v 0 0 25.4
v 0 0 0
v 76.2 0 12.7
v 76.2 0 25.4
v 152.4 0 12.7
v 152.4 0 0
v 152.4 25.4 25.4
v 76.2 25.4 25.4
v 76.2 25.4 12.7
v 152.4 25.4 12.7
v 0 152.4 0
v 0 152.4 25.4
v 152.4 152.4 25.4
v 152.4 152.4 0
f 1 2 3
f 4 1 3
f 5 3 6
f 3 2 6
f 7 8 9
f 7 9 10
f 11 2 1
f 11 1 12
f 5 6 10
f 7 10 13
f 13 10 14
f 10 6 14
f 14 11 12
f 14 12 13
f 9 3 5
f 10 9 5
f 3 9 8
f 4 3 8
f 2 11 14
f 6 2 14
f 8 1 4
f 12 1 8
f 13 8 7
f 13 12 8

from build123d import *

# Parameters (mm, degrees)
F0_W       = 152.4
F0_H       = 152.4
F1_DEPTH   = 25.4
F2_W       = 76.2
F2_H       = 12.7
F1_FACE1_W = 152.4
F1_FACE1_H = 25.4
F3_DEPTH   = 25.4


with BuildPart() as f1:
    # F0 (on Top) → F1 (new body)
    with BuildSketch(Plane.XY):
        with Locations((76.2, 76.2)):
            Rectangle(F0_W, F0_H)
    extrude(amount=F1_DEPTH)

    # F2 (on face) + F1_face1 (on face) → F3 (cut)
    with BuildSketch(Plane.XZ):
        with Locations((114.3, 19.05)):
            Rectangle(F2_W, F2_H)
    with BuildSketch(Plane(origin=(76.2, 152.4, 12.7), x_dir=(-1, 0, 0), z_dir=(0, 1, 0))):
        Rectangle(F1_FACE1_W, F1_FACE1_H)
    extrude(amount=-F3_DEPTH, dir=(0, -1, 0), mode=Mode.SUBTRACT)


solid = f1.part
